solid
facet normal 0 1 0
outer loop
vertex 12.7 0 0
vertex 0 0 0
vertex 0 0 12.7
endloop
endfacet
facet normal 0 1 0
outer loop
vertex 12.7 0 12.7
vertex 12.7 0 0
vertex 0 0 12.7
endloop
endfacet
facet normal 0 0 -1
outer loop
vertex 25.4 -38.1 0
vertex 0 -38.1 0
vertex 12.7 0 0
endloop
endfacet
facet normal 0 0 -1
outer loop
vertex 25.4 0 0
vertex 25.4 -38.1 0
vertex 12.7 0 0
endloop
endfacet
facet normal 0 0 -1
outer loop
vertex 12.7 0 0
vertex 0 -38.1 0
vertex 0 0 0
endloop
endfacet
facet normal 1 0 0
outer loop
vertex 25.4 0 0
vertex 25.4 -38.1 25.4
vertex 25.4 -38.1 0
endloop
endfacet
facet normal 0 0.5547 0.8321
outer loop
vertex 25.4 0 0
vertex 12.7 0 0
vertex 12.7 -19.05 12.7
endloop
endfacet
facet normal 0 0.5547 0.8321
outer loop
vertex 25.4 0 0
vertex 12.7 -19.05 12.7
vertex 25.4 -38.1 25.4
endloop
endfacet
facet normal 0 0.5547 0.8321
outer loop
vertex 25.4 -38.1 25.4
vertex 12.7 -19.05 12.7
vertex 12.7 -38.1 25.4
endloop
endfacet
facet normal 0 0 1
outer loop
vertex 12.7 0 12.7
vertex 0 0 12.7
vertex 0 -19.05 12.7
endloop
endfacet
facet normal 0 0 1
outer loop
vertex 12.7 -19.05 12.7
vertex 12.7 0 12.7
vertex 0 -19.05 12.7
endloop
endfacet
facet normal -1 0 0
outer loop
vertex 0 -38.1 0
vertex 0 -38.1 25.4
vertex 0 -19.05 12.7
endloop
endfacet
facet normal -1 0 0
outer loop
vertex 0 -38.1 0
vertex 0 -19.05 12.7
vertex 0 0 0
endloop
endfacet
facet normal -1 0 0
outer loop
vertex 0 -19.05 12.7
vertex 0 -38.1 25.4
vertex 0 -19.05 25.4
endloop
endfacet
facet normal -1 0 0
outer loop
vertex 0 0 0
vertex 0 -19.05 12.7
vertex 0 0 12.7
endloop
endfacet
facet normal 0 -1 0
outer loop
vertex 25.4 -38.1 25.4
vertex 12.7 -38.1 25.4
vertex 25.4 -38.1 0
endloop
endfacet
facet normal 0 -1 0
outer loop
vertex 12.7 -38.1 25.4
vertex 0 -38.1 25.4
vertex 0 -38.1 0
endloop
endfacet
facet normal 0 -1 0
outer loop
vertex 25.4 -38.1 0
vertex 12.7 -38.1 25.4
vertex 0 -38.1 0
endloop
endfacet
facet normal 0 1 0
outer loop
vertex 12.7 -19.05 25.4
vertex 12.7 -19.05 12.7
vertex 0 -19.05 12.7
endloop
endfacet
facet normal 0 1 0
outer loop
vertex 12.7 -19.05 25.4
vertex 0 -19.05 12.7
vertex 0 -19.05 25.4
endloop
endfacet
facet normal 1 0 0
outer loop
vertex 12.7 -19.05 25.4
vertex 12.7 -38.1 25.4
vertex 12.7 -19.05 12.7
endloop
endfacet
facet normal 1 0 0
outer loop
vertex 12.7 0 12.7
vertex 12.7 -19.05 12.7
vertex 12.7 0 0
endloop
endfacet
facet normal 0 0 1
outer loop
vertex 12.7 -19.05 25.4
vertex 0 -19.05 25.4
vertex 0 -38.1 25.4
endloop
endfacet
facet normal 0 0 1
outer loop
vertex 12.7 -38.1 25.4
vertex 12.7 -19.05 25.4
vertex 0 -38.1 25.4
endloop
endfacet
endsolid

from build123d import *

# Parameters (mm, degrees)
F2_DEPTH = 25.4
F3_DEPTH = 12.7


with BuildPart() as f2:
    # F0 (on Right) → F2 (new body)
    with BuildSketch(Plane.YZ):
        Polygon((0, 0), (-38.1, 25.4), (-38.1, 0), align=None)
    extrude(amount=F2_DEPTH)

    # F1 (on Right) → F3 (join)
    with BuildSketch(Plane.YZ):
        Polygon((-19.05, 25.4), (-38.1, 25.4), (-19.05, 12.7), align=None)
        Polygon((0, 12.7), (-19.05, 12.7), (0, 0), align=None)
    extrude(amount=F3_DEPTH)


solid = f2.part
